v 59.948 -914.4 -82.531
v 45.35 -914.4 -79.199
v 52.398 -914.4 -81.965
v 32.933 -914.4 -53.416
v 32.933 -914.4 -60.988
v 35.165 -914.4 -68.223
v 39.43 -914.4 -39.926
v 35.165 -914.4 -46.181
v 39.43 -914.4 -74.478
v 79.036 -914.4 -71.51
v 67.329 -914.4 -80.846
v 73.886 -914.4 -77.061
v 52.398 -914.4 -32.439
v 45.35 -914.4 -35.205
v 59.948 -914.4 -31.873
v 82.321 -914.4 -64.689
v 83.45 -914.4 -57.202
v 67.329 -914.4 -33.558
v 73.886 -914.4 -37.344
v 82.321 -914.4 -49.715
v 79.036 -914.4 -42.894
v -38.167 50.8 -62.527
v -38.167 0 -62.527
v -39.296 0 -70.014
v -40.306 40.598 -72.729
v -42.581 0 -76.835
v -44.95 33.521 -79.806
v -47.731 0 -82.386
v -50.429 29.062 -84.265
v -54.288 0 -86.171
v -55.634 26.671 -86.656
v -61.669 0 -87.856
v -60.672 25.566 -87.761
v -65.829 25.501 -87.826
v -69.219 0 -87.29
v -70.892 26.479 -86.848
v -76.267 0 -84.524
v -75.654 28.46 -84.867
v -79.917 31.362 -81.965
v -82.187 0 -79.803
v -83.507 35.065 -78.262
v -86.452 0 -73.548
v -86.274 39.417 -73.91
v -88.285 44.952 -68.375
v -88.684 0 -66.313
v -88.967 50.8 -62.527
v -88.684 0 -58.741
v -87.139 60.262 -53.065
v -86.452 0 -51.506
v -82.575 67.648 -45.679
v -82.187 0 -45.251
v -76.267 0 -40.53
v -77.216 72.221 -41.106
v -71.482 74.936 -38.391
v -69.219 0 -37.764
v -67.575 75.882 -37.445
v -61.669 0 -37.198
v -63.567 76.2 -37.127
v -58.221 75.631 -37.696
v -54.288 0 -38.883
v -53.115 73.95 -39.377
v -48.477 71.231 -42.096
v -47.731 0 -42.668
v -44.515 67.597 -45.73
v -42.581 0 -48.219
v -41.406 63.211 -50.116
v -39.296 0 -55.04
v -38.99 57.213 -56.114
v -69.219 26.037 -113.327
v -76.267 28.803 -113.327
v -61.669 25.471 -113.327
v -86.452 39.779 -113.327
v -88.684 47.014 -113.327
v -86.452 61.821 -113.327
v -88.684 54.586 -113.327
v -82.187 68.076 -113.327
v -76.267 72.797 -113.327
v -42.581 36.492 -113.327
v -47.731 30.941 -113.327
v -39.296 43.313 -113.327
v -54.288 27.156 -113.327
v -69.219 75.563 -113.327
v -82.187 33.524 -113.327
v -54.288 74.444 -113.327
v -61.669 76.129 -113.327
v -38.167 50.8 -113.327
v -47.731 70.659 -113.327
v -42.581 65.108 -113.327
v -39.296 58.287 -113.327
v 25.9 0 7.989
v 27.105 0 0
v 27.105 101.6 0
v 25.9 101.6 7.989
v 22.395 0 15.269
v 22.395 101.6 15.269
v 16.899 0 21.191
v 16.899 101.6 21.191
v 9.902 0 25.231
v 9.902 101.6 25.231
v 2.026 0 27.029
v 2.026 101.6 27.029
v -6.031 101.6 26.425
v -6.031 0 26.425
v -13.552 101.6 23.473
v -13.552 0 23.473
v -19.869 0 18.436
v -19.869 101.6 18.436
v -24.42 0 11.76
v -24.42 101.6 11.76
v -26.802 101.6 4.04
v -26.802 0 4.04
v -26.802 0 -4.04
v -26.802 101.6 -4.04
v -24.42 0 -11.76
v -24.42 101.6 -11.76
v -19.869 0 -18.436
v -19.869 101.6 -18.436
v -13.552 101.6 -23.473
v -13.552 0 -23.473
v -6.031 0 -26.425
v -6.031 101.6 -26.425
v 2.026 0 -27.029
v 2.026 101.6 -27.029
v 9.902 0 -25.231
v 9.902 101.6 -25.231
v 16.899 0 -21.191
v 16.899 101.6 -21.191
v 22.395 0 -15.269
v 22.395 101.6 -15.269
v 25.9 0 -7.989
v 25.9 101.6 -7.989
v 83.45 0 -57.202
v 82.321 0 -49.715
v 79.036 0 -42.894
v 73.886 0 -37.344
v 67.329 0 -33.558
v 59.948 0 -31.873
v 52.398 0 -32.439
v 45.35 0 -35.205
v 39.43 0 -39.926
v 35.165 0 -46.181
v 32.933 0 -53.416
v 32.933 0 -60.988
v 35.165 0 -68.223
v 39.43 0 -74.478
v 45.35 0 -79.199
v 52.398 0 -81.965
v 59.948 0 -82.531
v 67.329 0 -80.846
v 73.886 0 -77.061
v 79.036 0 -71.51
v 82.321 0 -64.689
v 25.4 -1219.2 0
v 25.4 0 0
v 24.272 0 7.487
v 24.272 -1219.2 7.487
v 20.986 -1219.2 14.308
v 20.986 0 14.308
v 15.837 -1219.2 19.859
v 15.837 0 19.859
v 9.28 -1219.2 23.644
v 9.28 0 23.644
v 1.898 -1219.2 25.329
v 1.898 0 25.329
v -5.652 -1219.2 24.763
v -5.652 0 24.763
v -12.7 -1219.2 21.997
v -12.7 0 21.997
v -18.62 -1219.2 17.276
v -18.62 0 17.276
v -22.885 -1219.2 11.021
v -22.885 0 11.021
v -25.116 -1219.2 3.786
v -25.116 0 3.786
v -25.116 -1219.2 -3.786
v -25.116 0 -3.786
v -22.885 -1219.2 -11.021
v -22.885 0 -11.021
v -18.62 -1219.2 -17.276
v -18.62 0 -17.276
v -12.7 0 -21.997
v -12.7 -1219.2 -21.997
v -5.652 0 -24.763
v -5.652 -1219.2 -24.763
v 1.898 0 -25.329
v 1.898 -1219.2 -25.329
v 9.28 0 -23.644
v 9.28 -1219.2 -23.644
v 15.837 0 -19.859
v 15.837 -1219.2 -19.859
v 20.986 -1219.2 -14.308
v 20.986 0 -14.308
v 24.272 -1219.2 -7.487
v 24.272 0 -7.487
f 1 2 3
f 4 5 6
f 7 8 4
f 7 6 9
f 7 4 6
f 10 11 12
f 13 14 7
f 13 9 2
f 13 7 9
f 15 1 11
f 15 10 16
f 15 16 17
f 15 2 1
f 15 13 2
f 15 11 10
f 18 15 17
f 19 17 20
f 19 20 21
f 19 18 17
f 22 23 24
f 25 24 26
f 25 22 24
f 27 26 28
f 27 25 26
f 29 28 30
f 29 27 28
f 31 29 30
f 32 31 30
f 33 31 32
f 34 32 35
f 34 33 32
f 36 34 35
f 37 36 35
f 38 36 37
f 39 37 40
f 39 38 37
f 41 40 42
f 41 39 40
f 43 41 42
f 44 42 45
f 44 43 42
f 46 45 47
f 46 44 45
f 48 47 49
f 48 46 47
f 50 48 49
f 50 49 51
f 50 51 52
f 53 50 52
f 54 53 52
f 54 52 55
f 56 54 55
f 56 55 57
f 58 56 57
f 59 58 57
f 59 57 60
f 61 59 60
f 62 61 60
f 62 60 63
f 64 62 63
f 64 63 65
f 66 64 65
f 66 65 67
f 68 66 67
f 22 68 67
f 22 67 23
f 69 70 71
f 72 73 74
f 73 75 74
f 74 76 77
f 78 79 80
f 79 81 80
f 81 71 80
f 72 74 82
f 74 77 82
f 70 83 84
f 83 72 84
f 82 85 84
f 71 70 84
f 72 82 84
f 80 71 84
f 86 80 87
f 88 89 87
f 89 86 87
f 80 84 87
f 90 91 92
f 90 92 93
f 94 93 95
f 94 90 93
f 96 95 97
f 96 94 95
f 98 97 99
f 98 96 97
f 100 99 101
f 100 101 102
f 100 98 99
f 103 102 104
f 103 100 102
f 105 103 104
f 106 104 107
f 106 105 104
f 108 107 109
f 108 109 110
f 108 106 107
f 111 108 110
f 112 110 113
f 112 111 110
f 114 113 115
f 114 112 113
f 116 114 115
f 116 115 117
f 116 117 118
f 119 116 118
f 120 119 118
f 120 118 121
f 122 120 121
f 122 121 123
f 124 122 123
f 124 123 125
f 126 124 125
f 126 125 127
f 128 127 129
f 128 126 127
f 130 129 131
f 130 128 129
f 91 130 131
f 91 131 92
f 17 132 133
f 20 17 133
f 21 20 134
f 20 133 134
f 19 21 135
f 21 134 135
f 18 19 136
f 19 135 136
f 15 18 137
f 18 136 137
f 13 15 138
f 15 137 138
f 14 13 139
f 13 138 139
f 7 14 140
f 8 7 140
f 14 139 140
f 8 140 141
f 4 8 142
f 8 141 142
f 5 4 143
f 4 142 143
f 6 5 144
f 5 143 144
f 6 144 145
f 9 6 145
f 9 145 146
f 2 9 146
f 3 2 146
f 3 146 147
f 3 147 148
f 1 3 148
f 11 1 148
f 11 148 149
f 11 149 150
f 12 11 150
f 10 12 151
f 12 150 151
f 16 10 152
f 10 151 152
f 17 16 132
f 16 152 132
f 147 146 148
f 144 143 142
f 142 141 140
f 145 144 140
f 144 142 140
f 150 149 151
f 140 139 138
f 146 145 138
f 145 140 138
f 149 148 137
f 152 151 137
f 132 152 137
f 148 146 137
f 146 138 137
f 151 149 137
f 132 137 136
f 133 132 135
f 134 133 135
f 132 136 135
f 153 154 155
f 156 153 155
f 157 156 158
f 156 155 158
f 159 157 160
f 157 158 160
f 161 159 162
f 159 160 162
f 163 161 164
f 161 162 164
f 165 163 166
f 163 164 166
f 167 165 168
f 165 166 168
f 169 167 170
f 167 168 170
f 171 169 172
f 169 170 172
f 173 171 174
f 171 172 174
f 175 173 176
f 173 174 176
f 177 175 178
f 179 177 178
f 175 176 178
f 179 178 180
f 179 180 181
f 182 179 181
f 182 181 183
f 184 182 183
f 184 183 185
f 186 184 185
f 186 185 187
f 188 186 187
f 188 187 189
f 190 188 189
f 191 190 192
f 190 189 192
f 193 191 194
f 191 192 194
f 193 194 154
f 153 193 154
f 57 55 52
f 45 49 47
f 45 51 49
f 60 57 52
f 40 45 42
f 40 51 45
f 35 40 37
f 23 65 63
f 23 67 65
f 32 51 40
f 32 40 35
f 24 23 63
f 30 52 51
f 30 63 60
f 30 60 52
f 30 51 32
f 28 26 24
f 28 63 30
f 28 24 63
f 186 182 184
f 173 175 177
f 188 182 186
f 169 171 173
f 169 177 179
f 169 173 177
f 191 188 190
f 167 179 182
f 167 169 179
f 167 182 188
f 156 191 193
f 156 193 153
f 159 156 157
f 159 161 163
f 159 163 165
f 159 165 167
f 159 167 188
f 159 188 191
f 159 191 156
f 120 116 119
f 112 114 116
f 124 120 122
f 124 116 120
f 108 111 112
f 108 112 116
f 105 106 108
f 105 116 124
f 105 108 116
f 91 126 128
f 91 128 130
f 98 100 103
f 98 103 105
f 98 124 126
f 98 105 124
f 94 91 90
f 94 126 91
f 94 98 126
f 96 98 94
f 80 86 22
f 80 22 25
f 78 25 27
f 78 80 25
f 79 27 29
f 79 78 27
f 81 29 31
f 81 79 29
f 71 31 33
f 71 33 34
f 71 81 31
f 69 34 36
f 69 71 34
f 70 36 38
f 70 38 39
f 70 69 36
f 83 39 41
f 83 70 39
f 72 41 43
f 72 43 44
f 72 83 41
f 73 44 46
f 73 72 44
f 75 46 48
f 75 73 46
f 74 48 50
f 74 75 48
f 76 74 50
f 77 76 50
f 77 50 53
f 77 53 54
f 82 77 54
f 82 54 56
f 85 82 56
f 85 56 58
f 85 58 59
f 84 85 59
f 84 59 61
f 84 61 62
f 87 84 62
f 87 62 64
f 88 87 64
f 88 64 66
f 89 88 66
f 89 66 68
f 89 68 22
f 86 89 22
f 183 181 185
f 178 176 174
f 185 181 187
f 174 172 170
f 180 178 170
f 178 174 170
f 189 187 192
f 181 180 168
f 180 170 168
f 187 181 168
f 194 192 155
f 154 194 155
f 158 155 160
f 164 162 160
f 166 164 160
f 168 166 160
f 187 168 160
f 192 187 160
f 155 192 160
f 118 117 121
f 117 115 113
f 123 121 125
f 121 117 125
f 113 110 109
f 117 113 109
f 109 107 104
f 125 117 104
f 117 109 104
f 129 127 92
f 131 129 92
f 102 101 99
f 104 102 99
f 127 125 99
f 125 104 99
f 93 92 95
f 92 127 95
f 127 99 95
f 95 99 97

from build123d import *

# Parameters (mm, degrees)
F0_R     = 25.4
F1_DEPTH = 1219.2
F2_R     = 27.1046494799
F3_DEPTH = 101.6
F4_R     = 25.4
F7_R     = 25.4
F8_DEPTH = 914.4


with BuildPart() as f1:
    # F0 (on Front) → F1 (new body)
    with BuildSketch(Plane.XZ):
        Circle(F0_R)
    extrude(amount=F1_DEPTH)


with BuildPart() as f3:
    # F2 (on Front) → F3 (new body)
    with BuildSketch(Plane.XZ):
        Circle(F2_R)
    extrude(amount=-F3_DEPTH)


with BuildPart() as f6:
    # F6: sweep along a path in F5
    with BuildLine(Plane.YZ) as f6_path:
        Line((0, -62.5270009041), (50.8, -62.5270009041))
        Line((50.8, -62.5270009041), (50.8, -113.3270009041))
    # F4 (on Front) → F6 (sweep)
    with BuildSketch(Plane.XZ):
        with Locations((-63.5673701763, -62.5270009041)):
            Circle(F4_R)
    sweep(path=f6_path.line, transition=Transition.RIGHT)


with BuildPart() as f8:
    # F7 (on Front) → F8 (new body)
    with BuildSketch(Plane.XZ):
        with Locations((58.0495595932, -57.2020560503)):
            Circle(F7_R)
    extrude(amount=F8_DEPTH)


solid = Compound([f1.part, f3.part, f6.part, f8.part])
